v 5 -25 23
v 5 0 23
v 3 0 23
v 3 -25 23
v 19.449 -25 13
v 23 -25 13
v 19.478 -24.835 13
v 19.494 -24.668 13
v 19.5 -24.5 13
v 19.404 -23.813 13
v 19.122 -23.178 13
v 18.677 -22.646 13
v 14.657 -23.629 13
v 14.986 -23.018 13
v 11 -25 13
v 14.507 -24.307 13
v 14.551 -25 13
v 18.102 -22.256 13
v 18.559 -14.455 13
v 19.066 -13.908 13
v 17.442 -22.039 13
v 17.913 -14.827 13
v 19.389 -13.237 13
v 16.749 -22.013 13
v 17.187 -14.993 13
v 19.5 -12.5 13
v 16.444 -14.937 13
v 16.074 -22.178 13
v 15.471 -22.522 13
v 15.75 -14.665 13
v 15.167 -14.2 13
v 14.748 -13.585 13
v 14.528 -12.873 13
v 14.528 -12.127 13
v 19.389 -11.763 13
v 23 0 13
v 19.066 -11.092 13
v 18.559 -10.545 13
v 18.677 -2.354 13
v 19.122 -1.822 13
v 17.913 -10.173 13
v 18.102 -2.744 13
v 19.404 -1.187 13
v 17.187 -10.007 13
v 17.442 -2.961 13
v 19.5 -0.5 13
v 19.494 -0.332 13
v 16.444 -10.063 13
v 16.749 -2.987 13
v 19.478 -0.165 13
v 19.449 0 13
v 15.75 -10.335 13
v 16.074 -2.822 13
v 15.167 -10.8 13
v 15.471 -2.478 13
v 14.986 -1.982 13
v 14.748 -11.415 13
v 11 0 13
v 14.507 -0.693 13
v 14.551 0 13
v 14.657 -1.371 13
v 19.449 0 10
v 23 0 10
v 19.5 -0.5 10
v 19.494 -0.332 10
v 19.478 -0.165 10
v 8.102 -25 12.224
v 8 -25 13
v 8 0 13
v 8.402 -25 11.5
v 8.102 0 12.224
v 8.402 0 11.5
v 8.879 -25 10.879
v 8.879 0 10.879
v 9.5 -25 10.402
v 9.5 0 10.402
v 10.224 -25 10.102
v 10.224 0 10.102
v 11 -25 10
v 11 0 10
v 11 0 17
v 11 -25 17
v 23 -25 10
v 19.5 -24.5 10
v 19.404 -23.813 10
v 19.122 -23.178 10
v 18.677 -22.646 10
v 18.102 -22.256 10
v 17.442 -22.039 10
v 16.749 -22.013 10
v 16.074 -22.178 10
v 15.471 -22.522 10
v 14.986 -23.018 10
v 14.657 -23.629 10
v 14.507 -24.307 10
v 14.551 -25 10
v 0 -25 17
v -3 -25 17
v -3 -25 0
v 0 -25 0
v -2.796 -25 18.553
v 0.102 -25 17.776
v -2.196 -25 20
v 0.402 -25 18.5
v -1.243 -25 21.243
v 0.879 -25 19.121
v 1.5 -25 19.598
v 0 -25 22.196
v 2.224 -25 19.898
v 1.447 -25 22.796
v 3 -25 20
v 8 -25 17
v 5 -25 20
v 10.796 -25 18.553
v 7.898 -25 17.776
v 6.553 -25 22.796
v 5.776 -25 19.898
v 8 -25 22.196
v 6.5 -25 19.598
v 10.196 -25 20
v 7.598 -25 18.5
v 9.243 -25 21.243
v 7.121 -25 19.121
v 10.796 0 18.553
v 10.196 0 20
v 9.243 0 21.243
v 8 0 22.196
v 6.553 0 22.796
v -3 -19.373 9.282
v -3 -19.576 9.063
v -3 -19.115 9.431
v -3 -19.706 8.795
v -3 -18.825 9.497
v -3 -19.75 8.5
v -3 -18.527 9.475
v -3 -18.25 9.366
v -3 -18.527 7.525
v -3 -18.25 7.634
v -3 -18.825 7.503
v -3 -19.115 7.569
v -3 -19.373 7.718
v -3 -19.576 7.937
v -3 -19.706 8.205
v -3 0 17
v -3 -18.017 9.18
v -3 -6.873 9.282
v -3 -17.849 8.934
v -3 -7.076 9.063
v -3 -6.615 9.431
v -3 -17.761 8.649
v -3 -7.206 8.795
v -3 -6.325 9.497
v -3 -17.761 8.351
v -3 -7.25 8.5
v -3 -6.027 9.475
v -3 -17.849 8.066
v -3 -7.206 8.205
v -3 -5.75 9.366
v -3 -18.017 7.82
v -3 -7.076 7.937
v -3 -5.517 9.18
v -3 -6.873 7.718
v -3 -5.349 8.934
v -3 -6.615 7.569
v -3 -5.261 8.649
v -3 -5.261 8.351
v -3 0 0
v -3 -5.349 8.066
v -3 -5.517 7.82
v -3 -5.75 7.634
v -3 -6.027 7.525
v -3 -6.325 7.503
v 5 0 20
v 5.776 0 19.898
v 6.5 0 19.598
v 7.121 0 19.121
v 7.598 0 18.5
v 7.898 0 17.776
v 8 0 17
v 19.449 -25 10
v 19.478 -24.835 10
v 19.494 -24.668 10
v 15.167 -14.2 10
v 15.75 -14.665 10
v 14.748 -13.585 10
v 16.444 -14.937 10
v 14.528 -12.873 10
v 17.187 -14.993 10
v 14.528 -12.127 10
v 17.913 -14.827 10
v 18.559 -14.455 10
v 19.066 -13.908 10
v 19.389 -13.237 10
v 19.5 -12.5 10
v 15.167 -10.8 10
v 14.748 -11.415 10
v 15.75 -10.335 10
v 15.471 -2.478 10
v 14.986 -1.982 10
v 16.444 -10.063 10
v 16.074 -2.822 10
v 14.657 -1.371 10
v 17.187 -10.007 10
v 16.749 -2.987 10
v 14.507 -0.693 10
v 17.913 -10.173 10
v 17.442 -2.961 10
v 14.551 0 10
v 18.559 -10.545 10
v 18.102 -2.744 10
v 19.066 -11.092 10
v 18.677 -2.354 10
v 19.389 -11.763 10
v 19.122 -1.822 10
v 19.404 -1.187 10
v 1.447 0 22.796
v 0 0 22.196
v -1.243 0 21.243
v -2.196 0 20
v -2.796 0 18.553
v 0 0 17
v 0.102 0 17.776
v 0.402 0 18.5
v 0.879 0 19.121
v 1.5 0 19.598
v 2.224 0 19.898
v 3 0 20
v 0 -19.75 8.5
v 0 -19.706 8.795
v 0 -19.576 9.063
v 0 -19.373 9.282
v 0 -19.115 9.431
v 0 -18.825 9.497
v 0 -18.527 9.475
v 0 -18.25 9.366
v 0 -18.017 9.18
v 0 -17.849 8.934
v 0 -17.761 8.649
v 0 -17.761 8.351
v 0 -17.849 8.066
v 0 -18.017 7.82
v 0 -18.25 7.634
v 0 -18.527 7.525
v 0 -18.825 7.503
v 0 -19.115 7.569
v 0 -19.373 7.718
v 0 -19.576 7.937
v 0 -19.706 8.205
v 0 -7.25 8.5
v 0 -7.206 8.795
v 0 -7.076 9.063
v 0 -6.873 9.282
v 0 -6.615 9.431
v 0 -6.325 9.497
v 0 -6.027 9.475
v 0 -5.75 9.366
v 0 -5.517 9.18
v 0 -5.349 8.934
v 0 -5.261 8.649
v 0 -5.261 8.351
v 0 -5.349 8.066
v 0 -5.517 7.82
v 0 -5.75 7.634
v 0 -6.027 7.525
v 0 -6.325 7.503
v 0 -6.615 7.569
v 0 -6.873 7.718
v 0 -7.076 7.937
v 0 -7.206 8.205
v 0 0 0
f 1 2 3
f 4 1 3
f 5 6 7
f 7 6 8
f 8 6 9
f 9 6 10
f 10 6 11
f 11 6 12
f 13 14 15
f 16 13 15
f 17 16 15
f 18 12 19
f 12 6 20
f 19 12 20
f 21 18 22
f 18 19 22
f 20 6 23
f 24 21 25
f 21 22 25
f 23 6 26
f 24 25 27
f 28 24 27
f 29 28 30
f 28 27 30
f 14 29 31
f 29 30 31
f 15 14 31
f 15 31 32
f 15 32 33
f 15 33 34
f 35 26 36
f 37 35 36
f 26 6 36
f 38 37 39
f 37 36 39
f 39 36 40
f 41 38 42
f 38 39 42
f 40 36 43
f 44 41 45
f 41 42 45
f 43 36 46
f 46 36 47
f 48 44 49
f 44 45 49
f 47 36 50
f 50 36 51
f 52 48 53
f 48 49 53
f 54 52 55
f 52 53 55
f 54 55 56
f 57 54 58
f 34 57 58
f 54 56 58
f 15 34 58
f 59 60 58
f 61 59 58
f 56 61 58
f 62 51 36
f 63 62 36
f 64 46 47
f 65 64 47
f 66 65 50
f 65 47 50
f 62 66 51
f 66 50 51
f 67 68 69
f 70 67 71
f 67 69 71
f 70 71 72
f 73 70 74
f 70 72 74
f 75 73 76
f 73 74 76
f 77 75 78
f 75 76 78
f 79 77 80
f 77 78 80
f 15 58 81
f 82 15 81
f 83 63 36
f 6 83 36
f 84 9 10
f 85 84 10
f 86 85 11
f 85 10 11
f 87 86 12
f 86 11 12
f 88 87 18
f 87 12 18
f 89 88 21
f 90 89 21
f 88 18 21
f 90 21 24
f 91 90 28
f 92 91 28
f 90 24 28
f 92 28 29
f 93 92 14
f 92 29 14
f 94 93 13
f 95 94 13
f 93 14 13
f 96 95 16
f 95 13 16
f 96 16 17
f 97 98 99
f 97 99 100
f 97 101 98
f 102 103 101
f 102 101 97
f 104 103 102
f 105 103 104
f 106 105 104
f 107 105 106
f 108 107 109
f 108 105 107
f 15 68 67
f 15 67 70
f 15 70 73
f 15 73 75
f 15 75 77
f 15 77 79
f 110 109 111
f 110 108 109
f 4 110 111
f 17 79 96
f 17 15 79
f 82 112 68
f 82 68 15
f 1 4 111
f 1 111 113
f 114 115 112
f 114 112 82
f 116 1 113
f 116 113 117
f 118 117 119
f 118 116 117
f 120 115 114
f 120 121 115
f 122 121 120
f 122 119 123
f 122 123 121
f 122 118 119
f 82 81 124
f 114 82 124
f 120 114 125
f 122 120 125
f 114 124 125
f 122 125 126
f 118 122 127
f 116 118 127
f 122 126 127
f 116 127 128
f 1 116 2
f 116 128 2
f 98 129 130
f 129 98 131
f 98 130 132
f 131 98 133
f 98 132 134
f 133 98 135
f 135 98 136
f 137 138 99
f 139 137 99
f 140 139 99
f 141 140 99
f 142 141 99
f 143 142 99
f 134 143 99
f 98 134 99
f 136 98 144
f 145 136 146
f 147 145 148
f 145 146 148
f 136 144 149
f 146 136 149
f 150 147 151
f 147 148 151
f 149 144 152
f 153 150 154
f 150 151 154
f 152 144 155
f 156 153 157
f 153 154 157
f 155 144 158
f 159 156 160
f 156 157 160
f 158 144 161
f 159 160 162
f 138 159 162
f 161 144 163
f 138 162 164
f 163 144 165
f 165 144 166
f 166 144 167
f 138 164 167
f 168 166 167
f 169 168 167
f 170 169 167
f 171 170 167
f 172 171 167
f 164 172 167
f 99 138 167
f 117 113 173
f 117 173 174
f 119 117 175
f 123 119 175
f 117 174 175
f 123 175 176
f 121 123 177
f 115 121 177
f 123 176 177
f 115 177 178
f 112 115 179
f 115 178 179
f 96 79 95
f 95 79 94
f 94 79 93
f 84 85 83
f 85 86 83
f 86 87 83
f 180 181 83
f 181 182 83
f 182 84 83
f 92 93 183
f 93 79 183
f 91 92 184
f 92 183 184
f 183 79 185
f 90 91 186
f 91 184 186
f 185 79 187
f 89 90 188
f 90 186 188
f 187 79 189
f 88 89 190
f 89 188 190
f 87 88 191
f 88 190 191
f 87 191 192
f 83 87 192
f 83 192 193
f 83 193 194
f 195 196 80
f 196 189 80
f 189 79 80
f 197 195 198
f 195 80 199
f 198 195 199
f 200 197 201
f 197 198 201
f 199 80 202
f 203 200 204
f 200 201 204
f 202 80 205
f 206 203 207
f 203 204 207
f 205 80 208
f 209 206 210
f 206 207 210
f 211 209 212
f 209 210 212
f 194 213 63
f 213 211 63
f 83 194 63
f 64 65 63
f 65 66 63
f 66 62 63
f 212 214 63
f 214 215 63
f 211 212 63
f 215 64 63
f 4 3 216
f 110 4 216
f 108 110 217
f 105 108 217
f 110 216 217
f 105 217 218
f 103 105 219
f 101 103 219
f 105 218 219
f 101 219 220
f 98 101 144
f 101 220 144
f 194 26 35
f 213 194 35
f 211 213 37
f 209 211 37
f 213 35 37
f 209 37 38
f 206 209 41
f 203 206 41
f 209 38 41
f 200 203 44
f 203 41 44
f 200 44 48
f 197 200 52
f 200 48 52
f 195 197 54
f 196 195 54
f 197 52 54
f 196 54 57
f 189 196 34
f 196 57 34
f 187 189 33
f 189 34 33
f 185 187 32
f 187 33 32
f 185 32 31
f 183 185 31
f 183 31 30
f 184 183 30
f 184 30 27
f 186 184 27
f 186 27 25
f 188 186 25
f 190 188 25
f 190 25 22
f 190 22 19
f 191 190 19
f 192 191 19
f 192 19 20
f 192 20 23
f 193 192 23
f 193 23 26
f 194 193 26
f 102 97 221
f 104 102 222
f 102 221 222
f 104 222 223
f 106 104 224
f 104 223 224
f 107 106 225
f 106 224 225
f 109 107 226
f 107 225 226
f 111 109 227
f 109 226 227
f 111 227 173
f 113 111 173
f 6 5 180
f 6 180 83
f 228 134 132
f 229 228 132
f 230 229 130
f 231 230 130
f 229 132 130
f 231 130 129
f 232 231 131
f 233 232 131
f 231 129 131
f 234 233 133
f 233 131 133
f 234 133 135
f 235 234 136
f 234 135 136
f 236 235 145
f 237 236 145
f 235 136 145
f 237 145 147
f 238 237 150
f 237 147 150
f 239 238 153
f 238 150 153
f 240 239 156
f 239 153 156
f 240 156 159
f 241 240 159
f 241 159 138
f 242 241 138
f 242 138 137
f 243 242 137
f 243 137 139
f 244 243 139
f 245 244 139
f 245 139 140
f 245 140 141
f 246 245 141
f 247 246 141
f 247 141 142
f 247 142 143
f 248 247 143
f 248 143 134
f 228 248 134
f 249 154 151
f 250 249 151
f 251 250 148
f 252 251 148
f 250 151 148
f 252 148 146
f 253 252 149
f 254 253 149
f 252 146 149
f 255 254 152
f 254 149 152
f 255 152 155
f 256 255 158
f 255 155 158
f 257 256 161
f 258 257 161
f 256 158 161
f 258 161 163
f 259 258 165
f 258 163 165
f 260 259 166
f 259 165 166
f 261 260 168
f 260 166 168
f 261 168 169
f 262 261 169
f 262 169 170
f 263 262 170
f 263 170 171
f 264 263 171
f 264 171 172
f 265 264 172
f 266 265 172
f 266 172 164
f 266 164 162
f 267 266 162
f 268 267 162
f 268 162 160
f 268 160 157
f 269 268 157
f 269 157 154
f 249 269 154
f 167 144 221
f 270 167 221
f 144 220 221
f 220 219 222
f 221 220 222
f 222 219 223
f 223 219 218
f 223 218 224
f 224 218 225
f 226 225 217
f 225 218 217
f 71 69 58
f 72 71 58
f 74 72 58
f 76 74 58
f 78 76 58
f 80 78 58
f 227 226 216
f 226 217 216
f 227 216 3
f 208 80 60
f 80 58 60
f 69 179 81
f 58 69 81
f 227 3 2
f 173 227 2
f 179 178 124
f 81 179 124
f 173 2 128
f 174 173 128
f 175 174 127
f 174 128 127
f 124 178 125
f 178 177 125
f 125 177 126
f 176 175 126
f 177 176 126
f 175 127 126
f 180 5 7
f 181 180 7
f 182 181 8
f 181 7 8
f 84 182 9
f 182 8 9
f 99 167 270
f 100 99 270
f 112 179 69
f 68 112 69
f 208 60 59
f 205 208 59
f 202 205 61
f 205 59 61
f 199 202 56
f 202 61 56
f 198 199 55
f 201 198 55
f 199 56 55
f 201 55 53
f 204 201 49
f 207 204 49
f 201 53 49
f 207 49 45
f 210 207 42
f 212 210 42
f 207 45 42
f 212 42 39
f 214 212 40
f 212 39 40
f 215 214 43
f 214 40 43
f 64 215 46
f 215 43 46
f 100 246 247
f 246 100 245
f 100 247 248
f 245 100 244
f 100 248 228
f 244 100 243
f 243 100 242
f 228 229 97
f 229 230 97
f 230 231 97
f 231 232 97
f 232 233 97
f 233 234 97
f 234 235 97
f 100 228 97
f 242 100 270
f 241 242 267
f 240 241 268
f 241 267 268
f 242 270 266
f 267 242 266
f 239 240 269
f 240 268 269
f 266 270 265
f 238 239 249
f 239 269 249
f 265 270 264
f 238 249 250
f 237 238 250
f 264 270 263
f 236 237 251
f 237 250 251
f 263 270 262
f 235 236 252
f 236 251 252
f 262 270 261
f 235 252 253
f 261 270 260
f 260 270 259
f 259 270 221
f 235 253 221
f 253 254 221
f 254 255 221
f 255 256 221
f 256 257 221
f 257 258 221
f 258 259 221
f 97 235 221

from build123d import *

# Parameters (mm, degrees)
F1_DEPTH = 25
F2_R     = 2.5
F3_DEPTH = 25
F4_R     = 1
F5_DEPTH = 5


with BuildPart() as f1:
    # F0 (on Front) → F1 (new body)
    with BuildSketch(Plane.XZ):
        with BuildLine():
            Line((-3, 0), (0, 0))
            Line((0, 0), (0, 17))
            ThreePointArc((0, 17), (0.87868, 19.12132), (3, 20))
            Line((3, 20), (5, 20))
            ThreePointArc((5, 20), (7.12132, 19.12132), (8, 17))
            Line((8, 17), (8, 13))
            ThreePointArc((8, 13), (8.87868, 10.87868), (11, 10))
            Line((11, 10), (23, 10))
            Line((23, 10), (23, 13))
            Line((23, 13), (11, 13))
            Line((11, 13), (11, 17))
            ThreePointArc((11, 17), (9.242641, 21.242641), (5, 23))
            Line((5, 23), (3, 23))
            ThreePointArc((3, 23), (-1.242641, 21.242641), (-3, 17))
            Line((-3, 17), (-3, 0))
        make_face()
    extrude(amount=F1_DEPTH)

    # F2 (on face) → F3 (cut)
    with BuildSketch(Plane.XY.offset(13)):
        with Locations((17, -12.5)):
            Circle(F2_R)
        with BuildLine():
            Line((14.55051, -25), (19.44949, -25))
            ThreePointArc((19.44949, -25), (19.48734, -24.751272), (19.5, -24.5))
            ThreePointArc((19.5, -24.5), (16.748728, -22.01266), (14.55051, -25))
        make_face()
        with BuildLine():
            ThreePointArc((14.55051, 0), (16.748728, -2.98734), (19.5, -0.5))
            ThreePointArc((19.5, -0.5), (19.48734, -0.248728), (19.44949, 0))
            Line((19.44949, 0), (14.55051, 0))
        make_face()
    extrude(amount=-F3_DEPTH, mode=Mode.SUBTRACT)

    # F4 (on face) → F5 (cut)
    with BuildSketch(Plane(origin=(-3, 0, 0), x_dir=(0, -1, 0), z_dir=(-1, 0, 0))):
        with Locations((18.75, 8.5)):
            Circle(F4_R)
        with Locations((6.25, 8.5)):
            Circle(F4_R)
    extrude(amount=-F5_DEPTH, mode=Mode.SUBTRACT)


solid = f1.part
